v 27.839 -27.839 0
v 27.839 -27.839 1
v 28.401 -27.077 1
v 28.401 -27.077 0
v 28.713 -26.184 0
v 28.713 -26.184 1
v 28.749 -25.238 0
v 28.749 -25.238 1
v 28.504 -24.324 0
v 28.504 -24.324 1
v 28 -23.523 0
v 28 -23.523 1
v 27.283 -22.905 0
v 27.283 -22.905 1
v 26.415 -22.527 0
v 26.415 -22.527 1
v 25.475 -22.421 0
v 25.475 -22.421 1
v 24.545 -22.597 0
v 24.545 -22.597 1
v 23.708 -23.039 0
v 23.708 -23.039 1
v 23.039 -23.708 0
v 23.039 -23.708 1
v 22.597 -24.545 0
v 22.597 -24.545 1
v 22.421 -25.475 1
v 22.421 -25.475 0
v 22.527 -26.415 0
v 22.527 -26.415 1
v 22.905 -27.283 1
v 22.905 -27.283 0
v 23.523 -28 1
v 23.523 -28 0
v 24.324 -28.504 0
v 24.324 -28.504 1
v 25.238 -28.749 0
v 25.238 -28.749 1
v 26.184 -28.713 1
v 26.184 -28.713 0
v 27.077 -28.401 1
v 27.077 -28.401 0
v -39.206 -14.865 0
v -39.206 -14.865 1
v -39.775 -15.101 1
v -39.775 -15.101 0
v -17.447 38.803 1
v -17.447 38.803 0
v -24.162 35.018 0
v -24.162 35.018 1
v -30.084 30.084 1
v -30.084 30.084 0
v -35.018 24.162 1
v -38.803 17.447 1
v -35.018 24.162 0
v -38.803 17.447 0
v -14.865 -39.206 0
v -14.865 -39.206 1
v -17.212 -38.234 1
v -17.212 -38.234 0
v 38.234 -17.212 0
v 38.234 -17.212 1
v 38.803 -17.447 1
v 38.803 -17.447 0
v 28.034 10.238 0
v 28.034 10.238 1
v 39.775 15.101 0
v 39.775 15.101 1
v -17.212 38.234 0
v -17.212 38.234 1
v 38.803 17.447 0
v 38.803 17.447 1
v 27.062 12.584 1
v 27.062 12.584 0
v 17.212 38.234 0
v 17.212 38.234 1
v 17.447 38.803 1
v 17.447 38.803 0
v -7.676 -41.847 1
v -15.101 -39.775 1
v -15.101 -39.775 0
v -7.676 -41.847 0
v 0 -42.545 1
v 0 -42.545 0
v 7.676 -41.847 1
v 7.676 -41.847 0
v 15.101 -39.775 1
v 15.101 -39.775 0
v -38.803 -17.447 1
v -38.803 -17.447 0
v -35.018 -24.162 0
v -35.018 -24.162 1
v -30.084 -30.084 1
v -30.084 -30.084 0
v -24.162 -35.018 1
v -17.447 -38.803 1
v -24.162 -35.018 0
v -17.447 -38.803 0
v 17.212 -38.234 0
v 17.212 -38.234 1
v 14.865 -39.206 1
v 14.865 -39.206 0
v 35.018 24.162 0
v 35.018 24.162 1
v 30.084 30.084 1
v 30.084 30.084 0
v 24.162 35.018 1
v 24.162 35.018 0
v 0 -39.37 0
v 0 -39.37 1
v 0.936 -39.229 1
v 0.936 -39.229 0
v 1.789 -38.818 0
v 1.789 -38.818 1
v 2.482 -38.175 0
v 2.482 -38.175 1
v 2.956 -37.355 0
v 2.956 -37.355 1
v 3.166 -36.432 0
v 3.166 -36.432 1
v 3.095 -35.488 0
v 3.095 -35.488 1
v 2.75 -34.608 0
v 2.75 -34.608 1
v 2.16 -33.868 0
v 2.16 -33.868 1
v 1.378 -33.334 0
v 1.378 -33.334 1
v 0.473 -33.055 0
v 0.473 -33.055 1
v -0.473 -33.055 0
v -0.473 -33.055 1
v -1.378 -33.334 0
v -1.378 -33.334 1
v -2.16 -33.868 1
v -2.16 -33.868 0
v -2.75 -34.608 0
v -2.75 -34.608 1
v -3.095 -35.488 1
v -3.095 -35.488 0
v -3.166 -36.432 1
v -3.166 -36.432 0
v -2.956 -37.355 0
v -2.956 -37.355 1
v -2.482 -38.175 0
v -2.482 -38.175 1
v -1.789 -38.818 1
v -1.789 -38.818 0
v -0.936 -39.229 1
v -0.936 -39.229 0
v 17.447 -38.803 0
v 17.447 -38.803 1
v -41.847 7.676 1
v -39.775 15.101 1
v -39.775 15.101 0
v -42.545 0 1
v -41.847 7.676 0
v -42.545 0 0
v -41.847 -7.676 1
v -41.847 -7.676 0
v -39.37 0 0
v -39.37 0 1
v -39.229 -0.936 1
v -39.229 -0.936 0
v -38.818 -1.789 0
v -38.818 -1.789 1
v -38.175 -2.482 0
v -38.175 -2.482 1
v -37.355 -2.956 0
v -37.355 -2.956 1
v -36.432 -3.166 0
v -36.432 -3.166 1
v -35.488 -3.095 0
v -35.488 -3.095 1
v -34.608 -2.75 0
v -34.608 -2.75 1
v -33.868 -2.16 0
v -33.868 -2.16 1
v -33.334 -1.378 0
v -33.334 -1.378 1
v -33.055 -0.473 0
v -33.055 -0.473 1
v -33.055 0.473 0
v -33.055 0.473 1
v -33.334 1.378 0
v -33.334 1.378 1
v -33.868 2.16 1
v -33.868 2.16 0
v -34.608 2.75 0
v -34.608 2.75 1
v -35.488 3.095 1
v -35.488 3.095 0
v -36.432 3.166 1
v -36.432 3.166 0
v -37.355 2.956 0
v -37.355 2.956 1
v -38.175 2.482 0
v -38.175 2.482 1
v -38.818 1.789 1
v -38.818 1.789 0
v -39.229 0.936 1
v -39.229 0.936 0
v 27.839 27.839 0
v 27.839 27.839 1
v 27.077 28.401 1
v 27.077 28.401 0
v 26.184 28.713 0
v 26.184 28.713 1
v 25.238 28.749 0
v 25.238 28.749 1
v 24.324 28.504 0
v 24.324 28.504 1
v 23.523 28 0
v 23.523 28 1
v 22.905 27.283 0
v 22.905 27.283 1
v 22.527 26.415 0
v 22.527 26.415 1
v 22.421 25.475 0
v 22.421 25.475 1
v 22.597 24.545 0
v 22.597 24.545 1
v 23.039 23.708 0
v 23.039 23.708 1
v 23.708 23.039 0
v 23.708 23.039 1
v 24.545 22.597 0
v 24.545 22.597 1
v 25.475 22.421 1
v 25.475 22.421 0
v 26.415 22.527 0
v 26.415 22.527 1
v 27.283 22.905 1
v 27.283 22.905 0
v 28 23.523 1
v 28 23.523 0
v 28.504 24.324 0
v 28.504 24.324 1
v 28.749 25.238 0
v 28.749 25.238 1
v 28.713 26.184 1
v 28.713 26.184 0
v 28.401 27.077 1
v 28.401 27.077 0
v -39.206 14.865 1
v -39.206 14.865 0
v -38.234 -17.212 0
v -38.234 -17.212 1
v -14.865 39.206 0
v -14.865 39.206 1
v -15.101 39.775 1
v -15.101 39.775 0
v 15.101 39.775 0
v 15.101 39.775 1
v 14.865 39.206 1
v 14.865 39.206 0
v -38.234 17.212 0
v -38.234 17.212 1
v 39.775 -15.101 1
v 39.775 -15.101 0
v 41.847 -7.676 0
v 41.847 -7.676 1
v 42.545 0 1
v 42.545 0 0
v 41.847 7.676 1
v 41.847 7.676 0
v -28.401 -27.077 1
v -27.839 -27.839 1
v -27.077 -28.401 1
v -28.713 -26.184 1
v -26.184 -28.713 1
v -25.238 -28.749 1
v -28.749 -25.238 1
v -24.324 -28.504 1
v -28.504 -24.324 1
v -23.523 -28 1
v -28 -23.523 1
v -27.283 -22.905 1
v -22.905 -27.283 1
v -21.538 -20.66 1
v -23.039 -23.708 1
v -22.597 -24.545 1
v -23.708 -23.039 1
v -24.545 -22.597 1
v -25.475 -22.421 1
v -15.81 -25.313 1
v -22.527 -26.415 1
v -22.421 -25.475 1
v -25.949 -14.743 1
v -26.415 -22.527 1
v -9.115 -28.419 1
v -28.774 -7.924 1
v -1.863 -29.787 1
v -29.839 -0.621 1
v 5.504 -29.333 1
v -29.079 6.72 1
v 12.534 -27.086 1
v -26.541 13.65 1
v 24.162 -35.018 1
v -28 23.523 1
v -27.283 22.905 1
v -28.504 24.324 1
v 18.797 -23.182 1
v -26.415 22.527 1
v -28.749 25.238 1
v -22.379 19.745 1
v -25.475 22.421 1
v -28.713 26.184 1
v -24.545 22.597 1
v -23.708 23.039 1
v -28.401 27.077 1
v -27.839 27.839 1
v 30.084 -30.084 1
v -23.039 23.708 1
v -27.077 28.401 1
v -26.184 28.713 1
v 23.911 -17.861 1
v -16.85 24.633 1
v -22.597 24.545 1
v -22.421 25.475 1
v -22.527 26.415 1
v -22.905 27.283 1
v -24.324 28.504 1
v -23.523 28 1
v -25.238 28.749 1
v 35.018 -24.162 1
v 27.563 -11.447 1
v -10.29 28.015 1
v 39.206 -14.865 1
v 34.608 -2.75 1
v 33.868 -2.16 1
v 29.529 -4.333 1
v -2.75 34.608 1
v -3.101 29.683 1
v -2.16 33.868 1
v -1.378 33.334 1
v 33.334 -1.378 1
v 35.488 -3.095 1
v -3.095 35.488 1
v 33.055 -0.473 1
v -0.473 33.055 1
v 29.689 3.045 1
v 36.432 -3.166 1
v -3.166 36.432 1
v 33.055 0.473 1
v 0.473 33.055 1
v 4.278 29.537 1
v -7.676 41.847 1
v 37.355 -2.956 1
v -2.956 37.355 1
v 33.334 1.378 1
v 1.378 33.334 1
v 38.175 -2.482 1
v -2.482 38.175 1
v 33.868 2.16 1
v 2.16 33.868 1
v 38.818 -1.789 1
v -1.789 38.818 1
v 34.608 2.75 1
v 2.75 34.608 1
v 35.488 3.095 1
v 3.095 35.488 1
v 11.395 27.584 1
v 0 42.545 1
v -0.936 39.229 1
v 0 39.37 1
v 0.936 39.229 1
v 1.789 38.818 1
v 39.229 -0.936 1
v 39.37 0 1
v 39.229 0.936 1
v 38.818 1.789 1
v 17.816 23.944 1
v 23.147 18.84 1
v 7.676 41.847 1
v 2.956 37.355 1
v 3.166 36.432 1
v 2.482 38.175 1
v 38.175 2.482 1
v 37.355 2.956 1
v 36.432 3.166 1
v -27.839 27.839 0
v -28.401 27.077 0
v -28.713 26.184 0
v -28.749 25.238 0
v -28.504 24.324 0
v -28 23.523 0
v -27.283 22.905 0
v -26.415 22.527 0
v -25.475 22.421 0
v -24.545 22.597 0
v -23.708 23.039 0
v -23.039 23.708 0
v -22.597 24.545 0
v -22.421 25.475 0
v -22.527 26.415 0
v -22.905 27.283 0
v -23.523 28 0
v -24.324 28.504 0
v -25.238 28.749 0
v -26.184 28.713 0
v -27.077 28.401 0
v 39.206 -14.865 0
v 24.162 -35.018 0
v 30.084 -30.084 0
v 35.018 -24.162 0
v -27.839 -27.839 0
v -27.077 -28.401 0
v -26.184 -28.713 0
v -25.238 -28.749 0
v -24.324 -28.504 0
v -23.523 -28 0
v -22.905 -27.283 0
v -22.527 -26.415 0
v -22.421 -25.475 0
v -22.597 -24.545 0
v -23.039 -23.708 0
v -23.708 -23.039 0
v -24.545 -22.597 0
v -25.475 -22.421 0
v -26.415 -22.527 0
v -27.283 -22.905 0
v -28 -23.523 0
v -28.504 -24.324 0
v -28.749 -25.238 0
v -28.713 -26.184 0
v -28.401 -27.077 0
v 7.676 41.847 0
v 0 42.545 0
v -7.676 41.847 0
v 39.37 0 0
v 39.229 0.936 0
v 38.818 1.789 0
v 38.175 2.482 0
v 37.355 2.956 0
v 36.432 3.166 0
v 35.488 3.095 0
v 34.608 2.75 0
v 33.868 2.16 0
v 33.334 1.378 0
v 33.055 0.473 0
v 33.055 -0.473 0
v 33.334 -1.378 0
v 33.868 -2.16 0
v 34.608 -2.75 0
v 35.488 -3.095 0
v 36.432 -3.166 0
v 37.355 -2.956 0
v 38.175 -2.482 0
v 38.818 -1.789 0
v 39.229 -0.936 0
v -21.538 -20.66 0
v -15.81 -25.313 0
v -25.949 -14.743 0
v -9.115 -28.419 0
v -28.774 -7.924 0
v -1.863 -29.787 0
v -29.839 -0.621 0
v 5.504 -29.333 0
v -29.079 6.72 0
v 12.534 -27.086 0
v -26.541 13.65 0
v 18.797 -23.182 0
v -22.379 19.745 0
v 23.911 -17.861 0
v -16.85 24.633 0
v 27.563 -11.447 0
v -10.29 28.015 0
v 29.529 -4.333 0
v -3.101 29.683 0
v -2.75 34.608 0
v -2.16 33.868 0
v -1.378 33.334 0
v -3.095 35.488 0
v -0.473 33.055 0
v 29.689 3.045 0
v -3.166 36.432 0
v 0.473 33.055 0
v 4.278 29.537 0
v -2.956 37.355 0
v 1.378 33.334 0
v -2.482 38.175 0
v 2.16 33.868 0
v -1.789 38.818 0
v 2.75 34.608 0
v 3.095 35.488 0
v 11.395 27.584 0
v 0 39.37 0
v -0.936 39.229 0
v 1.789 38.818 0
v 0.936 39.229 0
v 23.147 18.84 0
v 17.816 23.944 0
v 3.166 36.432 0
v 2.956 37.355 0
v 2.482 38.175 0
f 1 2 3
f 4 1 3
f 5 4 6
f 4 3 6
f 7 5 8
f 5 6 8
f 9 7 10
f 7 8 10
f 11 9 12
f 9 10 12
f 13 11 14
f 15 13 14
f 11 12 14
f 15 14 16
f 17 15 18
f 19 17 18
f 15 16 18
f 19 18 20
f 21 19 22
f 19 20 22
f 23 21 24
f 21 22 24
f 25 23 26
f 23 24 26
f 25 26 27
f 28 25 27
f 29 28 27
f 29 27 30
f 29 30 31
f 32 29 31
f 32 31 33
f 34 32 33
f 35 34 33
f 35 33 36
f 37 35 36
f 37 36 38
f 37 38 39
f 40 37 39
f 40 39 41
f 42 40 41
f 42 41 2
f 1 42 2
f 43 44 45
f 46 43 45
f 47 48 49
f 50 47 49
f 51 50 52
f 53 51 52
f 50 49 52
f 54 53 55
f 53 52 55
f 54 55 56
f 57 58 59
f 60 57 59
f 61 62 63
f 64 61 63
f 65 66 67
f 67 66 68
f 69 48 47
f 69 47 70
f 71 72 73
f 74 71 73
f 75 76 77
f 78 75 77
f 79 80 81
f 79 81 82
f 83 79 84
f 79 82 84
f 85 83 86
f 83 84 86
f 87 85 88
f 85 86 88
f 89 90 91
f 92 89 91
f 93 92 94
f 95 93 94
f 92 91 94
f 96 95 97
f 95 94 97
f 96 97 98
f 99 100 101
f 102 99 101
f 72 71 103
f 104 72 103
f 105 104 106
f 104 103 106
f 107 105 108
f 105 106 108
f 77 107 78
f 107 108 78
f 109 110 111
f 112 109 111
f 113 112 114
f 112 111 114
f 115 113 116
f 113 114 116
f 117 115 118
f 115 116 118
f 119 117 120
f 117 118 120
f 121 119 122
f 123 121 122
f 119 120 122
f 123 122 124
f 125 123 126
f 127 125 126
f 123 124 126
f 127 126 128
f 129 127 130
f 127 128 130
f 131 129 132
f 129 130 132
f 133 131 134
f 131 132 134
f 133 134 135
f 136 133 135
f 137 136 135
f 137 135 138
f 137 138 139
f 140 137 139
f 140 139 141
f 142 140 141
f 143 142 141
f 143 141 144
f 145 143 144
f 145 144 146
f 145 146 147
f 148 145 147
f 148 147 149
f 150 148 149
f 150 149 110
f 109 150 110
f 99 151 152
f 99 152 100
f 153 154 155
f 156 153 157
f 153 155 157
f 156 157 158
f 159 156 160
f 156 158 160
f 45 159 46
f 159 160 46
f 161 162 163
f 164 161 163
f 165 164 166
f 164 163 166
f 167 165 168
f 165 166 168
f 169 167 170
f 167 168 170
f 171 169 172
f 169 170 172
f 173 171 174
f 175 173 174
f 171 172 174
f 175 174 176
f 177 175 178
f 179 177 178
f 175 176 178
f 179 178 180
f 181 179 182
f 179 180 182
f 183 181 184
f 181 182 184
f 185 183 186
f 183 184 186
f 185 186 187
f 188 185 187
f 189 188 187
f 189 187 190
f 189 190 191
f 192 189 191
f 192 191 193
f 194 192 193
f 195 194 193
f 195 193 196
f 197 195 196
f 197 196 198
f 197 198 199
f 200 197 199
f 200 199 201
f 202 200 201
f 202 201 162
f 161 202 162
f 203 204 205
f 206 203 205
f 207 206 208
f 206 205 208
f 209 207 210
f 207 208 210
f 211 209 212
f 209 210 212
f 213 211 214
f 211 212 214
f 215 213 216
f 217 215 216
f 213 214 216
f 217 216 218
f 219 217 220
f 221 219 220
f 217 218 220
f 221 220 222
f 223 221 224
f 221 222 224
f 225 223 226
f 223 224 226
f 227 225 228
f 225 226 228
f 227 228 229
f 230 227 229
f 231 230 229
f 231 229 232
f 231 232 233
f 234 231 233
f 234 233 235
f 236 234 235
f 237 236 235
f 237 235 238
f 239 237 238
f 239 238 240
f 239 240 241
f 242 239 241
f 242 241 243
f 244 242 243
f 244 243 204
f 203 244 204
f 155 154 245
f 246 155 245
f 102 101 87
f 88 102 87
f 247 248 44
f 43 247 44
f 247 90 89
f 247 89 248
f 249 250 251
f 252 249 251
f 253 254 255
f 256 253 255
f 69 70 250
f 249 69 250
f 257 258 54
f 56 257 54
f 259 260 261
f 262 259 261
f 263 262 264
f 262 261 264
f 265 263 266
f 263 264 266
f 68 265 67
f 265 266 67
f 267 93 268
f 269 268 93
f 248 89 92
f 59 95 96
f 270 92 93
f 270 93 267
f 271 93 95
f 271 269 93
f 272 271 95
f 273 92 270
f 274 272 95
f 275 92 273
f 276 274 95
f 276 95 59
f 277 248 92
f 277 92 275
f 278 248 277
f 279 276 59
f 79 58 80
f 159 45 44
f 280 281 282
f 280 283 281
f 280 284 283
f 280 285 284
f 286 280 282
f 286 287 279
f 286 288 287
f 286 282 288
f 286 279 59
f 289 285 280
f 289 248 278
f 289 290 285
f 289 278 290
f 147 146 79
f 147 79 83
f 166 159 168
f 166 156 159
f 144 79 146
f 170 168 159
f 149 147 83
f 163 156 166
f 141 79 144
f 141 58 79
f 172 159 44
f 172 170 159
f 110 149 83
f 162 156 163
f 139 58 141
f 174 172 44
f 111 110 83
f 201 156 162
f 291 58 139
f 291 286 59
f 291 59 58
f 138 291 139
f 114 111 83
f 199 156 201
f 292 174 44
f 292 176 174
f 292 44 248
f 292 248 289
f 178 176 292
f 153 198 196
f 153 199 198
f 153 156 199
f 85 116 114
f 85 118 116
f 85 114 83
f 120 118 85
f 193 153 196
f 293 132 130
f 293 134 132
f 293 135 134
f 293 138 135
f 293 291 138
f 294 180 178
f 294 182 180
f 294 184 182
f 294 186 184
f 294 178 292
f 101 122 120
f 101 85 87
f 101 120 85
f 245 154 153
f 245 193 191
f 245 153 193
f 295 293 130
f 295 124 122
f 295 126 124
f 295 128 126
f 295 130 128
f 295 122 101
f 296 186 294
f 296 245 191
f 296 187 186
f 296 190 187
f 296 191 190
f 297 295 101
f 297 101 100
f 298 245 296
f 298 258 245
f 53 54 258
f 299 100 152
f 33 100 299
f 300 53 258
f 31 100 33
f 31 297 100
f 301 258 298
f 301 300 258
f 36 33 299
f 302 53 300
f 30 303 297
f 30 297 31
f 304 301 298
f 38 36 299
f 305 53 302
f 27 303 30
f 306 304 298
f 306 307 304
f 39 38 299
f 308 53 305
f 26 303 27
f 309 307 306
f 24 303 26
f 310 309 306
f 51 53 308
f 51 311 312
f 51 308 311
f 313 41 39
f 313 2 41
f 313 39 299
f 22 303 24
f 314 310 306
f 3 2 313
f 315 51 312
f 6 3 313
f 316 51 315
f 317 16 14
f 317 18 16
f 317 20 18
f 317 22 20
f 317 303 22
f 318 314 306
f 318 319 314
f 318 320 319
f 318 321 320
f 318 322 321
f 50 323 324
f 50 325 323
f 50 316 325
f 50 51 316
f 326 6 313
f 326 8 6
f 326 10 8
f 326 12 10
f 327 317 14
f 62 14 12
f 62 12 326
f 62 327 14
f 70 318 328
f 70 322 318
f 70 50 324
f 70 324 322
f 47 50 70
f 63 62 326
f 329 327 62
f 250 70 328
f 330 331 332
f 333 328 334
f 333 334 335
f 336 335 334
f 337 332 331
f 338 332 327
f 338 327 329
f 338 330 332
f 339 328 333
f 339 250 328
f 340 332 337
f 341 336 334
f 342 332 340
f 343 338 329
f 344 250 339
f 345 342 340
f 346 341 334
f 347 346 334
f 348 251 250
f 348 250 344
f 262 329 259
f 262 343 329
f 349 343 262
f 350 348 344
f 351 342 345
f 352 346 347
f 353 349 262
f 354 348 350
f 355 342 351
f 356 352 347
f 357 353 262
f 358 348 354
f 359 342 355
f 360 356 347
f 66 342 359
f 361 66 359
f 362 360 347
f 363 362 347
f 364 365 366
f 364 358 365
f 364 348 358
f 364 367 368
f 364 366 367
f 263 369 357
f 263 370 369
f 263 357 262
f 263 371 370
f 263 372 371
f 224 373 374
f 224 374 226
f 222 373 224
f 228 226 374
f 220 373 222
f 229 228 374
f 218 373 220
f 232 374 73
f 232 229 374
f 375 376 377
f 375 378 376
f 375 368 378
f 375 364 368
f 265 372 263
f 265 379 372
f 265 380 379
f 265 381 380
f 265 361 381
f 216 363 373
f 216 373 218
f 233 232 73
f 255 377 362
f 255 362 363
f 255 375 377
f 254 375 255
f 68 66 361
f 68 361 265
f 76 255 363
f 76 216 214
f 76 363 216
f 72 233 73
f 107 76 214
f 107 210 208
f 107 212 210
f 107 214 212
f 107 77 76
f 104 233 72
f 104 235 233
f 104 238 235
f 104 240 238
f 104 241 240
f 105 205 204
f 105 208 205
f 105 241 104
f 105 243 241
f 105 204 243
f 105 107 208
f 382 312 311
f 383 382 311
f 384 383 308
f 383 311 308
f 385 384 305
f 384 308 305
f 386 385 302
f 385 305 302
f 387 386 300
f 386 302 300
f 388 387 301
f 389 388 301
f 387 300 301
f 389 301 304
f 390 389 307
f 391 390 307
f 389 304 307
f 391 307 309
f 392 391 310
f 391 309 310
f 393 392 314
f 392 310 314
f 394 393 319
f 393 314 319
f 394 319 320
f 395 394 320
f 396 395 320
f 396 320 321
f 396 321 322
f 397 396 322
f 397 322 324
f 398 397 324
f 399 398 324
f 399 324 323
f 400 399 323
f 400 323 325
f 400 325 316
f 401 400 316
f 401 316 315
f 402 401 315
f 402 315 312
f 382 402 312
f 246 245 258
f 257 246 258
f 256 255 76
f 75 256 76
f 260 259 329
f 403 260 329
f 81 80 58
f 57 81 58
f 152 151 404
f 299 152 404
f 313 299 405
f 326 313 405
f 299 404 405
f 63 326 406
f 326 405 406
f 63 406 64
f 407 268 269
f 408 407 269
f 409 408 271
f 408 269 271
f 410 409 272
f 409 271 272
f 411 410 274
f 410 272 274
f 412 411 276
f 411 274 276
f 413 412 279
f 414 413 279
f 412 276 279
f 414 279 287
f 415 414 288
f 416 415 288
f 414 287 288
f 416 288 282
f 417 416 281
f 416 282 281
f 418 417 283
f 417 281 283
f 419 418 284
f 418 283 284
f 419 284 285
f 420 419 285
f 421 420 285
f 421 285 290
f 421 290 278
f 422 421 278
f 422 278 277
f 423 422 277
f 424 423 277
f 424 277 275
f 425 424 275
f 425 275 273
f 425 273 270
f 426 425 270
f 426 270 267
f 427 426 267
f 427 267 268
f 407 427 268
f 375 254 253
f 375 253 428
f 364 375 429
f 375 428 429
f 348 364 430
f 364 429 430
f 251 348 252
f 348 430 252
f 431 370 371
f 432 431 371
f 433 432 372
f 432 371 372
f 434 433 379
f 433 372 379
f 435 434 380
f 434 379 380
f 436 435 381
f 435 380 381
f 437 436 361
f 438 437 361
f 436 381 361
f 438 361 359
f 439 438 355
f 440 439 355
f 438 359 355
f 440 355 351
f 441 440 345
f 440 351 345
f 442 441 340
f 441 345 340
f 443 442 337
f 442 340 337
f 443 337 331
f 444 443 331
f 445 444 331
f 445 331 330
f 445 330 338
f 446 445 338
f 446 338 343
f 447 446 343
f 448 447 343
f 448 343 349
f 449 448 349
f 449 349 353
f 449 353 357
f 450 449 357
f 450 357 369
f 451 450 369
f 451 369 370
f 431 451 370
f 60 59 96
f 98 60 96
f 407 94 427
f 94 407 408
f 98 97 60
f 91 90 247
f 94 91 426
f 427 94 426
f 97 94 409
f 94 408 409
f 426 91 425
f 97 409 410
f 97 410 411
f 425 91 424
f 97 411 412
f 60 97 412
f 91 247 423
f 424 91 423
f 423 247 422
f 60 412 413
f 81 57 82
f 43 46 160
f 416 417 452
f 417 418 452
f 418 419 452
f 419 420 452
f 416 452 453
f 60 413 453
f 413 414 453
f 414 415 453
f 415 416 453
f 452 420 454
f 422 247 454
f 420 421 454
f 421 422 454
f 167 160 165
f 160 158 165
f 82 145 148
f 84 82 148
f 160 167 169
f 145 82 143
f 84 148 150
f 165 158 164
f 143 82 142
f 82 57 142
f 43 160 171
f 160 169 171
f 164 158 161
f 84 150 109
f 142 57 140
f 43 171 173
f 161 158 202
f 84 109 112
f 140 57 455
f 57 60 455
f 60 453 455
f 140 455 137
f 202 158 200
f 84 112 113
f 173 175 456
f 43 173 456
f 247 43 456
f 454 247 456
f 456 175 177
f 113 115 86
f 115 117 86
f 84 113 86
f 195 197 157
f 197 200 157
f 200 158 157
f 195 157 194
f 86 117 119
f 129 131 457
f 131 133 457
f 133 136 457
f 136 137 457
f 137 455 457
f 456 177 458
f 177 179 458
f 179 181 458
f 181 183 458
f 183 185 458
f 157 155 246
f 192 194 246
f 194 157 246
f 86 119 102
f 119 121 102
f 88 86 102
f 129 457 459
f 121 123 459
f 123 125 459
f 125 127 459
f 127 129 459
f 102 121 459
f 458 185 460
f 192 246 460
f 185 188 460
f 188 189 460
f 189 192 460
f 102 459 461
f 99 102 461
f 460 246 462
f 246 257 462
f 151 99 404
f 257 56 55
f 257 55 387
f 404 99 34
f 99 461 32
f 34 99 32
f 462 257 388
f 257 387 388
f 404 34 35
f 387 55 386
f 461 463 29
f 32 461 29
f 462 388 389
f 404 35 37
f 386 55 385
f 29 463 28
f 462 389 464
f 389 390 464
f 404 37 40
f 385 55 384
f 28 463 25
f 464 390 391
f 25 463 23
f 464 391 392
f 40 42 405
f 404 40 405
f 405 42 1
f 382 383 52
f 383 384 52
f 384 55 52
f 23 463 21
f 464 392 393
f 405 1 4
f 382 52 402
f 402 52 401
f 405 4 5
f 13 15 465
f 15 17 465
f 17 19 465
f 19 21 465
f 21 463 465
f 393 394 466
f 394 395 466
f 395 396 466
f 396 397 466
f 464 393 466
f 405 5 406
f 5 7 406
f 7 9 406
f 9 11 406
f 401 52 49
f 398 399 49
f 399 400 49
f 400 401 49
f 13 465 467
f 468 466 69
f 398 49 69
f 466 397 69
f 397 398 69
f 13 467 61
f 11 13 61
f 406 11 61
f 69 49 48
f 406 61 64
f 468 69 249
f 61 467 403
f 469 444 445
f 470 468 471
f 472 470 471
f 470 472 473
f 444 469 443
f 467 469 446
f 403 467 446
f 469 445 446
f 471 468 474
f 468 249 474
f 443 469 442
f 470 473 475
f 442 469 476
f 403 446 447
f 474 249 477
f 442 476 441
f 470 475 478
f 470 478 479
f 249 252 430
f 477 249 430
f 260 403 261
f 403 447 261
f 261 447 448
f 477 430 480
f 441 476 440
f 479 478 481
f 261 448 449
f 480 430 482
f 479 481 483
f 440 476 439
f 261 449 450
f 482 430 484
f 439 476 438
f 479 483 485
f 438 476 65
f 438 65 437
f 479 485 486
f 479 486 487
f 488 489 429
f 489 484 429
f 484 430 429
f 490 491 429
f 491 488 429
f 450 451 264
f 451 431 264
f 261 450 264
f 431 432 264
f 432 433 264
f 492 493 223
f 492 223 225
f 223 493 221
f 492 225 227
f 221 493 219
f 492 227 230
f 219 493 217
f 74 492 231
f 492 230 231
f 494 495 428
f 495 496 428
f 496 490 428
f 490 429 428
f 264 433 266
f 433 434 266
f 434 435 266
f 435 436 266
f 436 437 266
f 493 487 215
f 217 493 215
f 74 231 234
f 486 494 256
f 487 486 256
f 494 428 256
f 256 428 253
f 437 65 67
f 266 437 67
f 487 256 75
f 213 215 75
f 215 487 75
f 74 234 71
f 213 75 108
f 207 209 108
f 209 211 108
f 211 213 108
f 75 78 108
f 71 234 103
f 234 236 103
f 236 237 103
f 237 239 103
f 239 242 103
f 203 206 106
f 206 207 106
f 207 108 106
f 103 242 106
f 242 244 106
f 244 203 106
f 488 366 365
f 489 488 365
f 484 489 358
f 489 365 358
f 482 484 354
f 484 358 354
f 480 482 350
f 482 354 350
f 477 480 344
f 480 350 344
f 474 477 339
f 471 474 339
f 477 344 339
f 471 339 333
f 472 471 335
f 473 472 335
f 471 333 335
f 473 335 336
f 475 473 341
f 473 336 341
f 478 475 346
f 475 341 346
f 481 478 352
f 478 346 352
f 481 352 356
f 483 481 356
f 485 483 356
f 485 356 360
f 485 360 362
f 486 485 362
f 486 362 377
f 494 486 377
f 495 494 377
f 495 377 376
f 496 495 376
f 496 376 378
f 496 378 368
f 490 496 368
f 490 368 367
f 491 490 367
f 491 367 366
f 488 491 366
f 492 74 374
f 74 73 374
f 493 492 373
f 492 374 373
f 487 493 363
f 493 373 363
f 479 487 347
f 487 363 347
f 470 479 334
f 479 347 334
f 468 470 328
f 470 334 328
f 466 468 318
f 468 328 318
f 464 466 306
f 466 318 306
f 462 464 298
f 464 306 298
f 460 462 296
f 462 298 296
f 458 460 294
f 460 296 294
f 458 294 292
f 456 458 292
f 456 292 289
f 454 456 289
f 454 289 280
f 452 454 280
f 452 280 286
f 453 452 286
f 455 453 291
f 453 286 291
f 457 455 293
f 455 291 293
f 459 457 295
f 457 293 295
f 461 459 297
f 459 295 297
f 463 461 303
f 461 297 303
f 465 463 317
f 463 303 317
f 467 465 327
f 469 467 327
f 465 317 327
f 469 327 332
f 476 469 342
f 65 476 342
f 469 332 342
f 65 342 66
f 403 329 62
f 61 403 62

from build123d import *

# Parameters (mm, degrees)
SKETCH4_R           = 42.545
BOSS_EXTRUDE2_DEPTH = 1
SKETCH5_R           = 29.845
CUT_EXTRUDE5_DEPTH  = 2
SKETCH6_R           = 3.175
CUT_EXTRUDE6_DEPTH  = 2
CIRPATTERN1_COUNT   = 8
CUT_EXTRUDE11_DEPTH = 2


with BuildPart() as part:
    # Sketch4 → Boss-Extrude2 (new body)
    with BuildSketch(Plane.XY):
        Circle(SKETCH4_R)
    extrude(amount=BOSS_EXTRUDE2_DEPTH)

    # Sketch5 → Cut-Extrude5 (cut, through all)
    with BuildSketch(Plane.XY.offset(1)):
        Circle(SKETCH5_R)
    extrude(amount=-CUT_EXTRUDE5_DEPTH, mode=Mode.SUBTRACT)

    # Sketch6 → Cut-Extrude6 (cut, through all)
    with BuildSketch(Plane.XY.offset(1)):
        with Locations((36.195, 0)):
            Circle(SKETCH6_R)
    cut_extrude6 = extrude(amount=-CUT_EXTRUDE6_DEPTH, mode=Mode.SUBTRACT)

    # CirPattern1: Cut-Extrude6 ×8 about axis
    cirpattern1_axis = Axis((0, 0, 0), (0, 0, 1))
    for i in range(1, CIRPATTERN1_COUNT):
        add(cut_extrude6.rotate(cirpattern1_axis, i * 360 / CIRPATTERN1_COUNT), mode=Mode.SUBTRACT)

    # Sketch8 → Cut-Extrude11 (cut, through all)
    with BuildSketch(Plane.XY.offset(1)):
        Polygon((42.34042777, 18.912617514), (23.56719567, 11.136490168), (24.539211588, 8.789836155), (43.312443689, 16.565963501), align=None)
        Polygon((17.697597616, 39.407110255), (15.350943603, 40.379126173), (14.864935644, 39.205799167), (17.211589657, 38.233783248), align=None)
        Polygon((-15.350943603, 40.379126173), (-17.697597616, 39.407110255), (-17.211589657, 38.233783248), (-14.864935644, 39.205799167), align=None)
        Polygon((-39.407110255, 17.697597616), (-40.379126173, 15.350943603), (-39.205799167, 14.864935644), (-38.233783248, 17.211589657), align=None)
        Polygon((-40.379126173, -15.350943603), (-39.407110255, -17.697597616), (-38.233783248, -17.211589657), (-39.205799167, -14.864935644), align=None)
        Polygon((-17.697597616, -39.407110255), (-15.350943603, -40.379126173), (-14.864935644, -39.205799167), (-17.211589657, -38.233783248), align=None)
        Polygon((15.350943603, -40.379126173), (17.697597616, -39.407110255), (17.211589657, -38.233783248), (14.864935644, -39.205799167), align=None)
        Polygon((39.407110255, -17.697597616), (40.379126173, -15.350943603), (39.205799167, -14.864935644), (38.233783248, -17.211589657), align=None)
    extrude(amount=-CUT_EXTRUDE11_DEPTH, mode=Mode.SUBTRACT)


solid = part.part
